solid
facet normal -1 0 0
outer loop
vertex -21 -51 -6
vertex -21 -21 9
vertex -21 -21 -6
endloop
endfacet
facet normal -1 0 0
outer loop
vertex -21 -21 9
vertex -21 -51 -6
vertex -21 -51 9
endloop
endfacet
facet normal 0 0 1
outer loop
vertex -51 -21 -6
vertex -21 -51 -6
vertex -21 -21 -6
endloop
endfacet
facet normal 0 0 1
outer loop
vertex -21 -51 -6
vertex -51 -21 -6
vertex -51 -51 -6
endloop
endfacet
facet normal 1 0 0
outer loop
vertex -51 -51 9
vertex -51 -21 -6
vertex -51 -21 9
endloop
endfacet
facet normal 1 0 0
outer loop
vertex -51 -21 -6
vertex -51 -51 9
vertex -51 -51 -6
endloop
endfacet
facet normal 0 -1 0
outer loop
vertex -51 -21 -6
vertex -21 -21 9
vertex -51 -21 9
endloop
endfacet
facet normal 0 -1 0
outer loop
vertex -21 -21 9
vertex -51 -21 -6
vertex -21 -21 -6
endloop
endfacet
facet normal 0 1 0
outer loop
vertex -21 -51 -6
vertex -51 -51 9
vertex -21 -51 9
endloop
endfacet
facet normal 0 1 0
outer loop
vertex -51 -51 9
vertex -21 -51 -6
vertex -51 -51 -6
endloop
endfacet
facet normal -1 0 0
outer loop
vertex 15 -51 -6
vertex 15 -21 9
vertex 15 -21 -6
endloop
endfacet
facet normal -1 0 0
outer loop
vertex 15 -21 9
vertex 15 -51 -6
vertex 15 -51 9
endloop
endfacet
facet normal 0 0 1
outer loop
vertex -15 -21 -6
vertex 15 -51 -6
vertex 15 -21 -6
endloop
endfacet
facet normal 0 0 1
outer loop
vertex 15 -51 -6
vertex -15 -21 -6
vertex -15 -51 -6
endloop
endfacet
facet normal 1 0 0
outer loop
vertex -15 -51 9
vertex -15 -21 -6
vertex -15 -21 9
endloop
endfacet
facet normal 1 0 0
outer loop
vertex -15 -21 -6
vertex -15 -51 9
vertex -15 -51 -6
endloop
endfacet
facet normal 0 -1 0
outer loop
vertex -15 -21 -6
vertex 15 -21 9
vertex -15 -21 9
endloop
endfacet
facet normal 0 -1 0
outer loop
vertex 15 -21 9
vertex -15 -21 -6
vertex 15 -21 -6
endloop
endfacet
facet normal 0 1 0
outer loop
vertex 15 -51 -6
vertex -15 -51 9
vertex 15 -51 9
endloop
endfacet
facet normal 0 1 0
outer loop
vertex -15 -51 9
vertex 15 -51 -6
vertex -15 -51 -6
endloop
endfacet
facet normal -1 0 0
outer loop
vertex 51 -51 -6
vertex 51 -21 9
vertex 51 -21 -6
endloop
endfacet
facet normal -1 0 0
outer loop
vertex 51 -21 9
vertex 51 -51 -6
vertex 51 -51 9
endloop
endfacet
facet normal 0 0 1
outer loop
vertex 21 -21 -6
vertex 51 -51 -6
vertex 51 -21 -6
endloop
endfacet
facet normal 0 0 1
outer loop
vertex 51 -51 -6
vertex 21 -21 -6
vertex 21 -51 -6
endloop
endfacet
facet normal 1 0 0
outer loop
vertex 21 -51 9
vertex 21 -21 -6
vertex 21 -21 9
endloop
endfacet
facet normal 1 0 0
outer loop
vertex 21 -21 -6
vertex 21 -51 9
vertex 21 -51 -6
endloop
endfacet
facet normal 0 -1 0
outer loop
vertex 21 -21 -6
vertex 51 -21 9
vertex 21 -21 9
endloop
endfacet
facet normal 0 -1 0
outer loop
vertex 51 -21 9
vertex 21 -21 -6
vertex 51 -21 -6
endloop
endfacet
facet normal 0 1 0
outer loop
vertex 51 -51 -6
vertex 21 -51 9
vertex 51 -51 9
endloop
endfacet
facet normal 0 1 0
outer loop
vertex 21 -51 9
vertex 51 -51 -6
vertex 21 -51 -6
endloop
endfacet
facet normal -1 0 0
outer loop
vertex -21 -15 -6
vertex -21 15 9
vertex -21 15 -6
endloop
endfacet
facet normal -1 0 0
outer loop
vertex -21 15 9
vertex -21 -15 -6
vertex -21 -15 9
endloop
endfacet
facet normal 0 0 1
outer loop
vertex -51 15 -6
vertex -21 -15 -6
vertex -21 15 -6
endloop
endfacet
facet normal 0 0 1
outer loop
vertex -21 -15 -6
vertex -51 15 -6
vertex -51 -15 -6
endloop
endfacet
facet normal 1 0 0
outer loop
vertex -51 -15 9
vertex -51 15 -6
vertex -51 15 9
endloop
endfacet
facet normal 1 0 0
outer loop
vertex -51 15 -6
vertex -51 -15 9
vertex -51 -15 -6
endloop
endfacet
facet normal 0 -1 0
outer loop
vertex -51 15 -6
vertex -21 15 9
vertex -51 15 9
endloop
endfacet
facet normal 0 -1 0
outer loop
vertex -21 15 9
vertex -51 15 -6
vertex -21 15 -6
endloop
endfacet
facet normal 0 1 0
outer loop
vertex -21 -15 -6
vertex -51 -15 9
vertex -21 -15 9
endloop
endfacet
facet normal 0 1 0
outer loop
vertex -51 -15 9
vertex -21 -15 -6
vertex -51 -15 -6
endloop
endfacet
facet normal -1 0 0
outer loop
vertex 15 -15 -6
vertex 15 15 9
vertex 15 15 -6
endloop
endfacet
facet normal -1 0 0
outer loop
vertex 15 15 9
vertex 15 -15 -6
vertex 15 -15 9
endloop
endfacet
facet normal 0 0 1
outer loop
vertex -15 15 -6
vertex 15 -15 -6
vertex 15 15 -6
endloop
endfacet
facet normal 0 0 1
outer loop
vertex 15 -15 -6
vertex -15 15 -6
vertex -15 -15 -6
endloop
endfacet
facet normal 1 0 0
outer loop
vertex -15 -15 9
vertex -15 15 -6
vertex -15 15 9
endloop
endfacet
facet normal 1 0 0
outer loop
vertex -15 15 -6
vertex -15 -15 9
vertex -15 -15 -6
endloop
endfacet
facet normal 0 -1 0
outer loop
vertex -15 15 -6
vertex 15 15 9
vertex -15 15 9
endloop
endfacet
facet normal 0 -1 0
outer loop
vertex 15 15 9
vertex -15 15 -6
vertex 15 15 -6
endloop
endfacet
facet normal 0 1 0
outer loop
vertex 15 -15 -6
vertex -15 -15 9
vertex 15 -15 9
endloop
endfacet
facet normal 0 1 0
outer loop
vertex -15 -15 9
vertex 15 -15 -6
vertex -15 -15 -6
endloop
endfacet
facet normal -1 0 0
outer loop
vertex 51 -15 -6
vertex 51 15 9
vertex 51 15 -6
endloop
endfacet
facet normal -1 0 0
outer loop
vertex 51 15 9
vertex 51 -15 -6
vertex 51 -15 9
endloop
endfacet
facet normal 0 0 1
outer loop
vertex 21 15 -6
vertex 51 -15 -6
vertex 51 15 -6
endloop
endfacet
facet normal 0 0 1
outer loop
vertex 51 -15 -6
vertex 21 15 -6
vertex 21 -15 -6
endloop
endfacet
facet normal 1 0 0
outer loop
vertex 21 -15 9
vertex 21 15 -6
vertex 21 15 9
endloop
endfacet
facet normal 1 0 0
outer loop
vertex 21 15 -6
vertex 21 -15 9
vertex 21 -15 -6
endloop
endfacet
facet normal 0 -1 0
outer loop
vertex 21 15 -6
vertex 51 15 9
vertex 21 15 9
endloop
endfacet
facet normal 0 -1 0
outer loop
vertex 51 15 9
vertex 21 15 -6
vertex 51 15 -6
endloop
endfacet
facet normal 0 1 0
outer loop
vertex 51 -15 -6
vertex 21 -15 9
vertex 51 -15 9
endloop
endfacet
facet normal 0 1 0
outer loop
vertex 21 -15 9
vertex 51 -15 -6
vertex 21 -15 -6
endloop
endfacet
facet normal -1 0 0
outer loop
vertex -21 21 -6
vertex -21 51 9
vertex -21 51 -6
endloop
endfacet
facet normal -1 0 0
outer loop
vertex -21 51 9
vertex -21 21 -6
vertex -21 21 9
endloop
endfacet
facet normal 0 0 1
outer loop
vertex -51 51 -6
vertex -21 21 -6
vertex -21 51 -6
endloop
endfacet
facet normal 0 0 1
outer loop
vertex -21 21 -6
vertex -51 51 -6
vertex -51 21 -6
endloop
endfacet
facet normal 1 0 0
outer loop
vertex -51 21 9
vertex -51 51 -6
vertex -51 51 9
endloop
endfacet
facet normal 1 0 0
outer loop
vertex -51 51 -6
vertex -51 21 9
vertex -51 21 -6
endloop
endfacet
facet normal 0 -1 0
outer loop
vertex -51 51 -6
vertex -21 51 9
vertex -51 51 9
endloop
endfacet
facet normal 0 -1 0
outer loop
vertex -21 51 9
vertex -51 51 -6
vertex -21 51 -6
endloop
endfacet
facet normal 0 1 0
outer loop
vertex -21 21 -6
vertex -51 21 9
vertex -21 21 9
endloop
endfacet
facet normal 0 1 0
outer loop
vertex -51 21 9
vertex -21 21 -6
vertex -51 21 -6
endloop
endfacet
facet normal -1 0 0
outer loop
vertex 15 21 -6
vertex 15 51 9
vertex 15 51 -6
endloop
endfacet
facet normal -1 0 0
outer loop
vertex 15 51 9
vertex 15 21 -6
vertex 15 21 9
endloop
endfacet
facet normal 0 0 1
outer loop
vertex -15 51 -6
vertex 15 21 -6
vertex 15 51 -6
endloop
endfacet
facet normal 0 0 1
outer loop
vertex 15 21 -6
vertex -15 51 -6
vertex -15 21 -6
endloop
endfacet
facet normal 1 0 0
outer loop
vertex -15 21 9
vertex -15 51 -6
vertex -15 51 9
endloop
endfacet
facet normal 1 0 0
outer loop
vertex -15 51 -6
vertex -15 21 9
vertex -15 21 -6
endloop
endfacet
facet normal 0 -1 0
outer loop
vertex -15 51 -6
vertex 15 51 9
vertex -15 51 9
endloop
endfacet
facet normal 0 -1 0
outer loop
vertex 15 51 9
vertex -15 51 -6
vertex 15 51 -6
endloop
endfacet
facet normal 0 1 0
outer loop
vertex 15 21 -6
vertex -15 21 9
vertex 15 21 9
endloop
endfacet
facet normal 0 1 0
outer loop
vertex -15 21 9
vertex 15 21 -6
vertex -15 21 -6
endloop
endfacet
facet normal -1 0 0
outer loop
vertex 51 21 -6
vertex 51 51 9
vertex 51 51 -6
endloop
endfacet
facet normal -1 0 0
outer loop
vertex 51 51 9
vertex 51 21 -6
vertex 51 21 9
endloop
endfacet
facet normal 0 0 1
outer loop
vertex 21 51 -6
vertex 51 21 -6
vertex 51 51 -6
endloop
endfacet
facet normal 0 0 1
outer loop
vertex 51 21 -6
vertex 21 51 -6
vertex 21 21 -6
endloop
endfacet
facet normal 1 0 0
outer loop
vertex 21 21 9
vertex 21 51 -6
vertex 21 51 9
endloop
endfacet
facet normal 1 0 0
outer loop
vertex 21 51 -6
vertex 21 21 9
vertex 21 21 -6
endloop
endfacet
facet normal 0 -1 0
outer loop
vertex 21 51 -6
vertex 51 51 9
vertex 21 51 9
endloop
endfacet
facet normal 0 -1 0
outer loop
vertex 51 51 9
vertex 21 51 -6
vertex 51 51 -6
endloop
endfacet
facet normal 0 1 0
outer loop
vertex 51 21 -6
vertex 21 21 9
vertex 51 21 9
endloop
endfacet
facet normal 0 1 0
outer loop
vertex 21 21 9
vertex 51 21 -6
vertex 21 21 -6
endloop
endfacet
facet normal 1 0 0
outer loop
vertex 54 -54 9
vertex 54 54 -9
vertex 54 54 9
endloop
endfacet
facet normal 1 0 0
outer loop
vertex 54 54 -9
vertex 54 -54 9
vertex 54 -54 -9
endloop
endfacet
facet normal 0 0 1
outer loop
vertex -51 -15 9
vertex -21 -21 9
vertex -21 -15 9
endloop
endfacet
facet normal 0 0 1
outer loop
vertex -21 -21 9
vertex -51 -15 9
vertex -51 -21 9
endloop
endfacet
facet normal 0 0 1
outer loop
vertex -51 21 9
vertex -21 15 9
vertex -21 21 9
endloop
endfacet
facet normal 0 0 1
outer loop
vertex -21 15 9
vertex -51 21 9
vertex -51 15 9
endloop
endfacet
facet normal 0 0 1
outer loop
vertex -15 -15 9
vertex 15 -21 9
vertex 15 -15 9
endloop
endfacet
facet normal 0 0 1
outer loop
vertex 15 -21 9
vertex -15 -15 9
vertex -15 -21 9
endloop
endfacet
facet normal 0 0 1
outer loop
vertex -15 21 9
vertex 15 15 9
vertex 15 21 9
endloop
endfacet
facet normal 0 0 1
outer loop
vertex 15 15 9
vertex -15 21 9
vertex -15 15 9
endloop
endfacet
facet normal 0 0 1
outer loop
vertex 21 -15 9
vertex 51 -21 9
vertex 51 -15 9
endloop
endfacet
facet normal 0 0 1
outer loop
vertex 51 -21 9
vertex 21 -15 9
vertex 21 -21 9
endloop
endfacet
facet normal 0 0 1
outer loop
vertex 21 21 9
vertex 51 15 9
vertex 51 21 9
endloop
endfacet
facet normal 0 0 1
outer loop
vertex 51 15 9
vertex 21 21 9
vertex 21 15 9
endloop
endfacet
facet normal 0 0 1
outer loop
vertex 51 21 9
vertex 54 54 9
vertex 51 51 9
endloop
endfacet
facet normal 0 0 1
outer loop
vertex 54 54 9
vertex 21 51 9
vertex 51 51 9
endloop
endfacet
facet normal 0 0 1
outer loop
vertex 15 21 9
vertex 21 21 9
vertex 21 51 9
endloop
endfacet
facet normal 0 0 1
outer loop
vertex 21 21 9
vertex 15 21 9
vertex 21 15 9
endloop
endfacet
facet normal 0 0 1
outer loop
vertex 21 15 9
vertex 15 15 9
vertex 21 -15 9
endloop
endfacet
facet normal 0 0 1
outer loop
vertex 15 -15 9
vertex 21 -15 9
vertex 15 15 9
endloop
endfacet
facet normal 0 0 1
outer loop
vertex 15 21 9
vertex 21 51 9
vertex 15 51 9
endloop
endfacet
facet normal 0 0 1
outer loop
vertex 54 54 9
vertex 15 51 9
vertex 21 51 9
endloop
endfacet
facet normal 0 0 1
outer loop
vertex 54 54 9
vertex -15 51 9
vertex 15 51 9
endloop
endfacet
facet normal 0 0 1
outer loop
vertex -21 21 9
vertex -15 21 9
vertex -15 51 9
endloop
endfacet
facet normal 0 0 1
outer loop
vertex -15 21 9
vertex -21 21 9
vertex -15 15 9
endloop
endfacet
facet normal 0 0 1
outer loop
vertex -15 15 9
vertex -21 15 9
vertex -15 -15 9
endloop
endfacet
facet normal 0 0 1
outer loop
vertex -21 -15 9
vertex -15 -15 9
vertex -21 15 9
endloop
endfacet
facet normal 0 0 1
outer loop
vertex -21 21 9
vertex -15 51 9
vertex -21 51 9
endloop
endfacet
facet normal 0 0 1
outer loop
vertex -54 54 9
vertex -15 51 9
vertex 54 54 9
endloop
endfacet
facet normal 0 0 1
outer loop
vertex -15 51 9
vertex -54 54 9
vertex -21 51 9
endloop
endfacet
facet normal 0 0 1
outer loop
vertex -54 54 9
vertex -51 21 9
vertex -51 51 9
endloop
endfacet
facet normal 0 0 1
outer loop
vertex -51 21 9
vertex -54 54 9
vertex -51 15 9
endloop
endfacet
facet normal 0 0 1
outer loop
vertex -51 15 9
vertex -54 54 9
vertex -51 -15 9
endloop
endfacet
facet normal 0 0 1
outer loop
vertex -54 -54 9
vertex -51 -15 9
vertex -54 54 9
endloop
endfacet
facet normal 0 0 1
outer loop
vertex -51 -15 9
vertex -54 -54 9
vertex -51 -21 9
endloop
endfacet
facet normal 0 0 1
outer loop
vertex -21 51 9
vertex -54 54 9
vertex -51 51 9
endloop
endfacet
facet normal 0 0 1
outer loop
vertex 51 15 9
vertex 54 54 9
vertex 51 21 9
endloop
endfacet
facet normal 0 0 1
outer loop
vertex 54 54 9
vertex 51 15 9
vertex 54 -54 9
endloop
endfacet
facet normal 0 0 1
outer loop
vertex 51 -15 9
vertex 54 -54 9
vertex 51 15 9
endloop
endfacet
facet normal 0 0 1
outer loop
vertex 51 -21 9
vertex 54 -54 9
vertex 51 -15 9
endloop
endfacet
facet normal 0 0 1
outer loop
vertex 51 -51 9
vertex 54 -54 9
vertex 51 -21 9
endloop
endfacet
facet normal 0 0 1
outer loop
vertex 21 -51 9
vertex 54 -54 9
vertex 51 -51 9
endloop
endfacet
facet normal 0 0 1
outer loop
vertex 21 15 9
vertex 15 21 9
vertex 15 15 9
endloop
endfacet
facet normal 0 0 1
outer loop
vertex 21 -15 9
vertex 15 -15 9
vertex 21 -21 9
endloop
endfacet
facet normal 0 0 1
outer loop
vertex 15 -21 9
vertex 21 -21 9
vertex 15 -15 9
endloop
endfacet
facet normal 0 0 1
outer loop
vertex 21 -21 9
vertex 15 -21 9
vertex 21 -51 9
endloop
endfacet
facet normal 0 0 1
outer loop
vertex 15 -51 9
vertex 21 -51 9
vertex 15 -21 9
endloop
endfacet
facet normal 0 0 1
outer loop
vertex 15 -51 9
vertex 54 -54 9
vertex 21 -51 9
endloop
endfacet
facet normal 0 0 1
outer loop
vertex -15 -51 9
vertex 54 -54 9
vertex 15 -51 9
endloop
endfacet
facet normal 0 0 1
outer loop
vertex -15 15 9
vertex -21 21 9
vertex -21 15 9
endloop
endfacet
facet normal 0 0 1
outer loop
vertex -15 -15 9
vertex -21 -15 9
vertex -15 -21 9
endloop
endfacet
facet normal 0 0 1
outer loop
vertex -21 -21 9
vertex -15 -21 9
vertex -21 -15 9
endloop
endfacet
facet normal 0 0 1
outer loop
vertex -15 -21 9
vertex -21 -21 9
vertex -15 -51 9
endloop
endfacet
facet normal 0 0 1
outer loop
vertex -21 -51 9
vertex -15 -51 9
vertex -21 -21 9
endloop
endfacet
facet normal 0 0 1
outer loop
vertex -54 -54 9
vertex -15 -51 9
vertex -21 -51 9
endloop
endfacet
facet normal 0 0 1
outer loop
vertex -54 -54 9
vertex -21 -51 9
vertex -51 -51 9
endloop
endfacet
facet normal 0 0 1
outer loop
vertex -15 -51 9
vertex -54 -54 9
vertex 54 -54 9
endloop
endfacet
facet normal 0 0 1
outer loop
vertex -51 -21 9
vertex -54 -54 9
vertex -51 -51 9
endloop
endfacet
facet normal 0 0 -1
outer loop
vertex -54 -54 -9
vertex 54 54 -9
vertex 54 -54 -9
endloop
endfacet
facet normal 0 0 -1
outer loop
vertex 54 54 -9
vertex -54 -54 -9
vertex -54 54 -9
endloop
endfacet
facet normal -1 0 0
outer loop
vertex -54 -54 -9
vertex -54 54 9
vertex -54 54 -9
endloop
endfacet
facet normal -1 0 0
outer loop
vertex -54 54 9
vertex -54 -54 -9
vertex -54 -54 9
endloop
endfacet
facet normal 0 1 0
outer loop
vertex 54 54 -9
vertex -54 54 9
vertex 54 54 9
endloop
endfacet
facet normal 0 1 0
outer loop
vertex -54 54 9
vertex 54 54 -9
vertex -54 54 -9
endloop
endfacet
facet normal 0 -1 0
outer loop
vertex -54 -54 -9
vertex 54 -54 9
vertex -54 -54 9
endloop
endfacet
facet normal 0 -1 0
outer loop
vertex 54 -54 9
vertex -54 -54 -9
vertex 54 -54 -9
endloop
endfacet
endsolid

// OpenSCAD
$fn = 32;

// ----------------------------------------------------------------------
// Pocket plate 108 x 108 x 18
// 3 x 3 pockets 30 mm square, 15 mm deep
// ----------------------------------------------------------------------

// --- parameters (mm) ---
thickness = 18;   // plate thickness
seat_tol = 0.15;  // tolerance at the seating features
free_tol = 0.5;   // general tolerance on the free sizes
floor_t = 3;      // material left under each pocket
pocket = 30;      // pocket side length
pitch_x = 36;     // pocket pitch along X
pitch_y = 36;     // pocket pitch along Y
cols = 3;         // pockets per row
rows = 3;         // rows of pockets

// --- derived feature positions (mm) ---
depth = thickness - floor_t;        // = 15   pocket depth, down to the floor
span_x = (cols - 1) * pitch_x;      // = 72   distance between outer pockets
span_y = (rows - 1) * pitch_y;      // = 72   distance between outer pocket rows
origin_x = -span_x / 2;             // = -36   X of the first pocket
origin_y = -span_y / 2;             // = -36   Y of the first pocket
plate = [span_x + pocket + 6, span_y + pocket + 6, thickness];  // = [108, 108, 18]   overall size: pockets plus 3 mm of wall on each side
feature_centers = [
  [origin_x + 0 * pitch_x, origin_y + 0 * pitch_y],
  [origin_x + 1 * pitch_x, origin_y + 0 * pitch_y],
  [origin_x + 2 * pitch_x, origin_y + 0 * pitch_y],
  [origin_x + 0 * pitch_x, origin_y + 1 * pitch_y],
  [origin_x + 1 * pitch_x, origin_y + 1 * pitch_y],
  [origin_x + 2 * pitch_x, origin_y + 1 * pitch_y],
  [origin_x + 0 * pitch_x, origin_y + 2 * pitch_y],
  [origin_x + 1 * pitch_x, origin_y + 2 * pitch_y],
  [origin_x + 2 * pitch_x, origin_y + 2 * pitch_y]
];   // pocket centres, used verbatim by the cutter loop

// plate outline, then one pocket per centre in feature_centers
difference() {
  cube(plate, center = true);
  for (centre = feature_centers)
    translate([centre[0] - pocket / 2, centre[1] - pocket / 2, plate[2] / 2 - depth])
      cube([pocket, pocket, depth + 1]);  // centred on the declared pocket centre
}
